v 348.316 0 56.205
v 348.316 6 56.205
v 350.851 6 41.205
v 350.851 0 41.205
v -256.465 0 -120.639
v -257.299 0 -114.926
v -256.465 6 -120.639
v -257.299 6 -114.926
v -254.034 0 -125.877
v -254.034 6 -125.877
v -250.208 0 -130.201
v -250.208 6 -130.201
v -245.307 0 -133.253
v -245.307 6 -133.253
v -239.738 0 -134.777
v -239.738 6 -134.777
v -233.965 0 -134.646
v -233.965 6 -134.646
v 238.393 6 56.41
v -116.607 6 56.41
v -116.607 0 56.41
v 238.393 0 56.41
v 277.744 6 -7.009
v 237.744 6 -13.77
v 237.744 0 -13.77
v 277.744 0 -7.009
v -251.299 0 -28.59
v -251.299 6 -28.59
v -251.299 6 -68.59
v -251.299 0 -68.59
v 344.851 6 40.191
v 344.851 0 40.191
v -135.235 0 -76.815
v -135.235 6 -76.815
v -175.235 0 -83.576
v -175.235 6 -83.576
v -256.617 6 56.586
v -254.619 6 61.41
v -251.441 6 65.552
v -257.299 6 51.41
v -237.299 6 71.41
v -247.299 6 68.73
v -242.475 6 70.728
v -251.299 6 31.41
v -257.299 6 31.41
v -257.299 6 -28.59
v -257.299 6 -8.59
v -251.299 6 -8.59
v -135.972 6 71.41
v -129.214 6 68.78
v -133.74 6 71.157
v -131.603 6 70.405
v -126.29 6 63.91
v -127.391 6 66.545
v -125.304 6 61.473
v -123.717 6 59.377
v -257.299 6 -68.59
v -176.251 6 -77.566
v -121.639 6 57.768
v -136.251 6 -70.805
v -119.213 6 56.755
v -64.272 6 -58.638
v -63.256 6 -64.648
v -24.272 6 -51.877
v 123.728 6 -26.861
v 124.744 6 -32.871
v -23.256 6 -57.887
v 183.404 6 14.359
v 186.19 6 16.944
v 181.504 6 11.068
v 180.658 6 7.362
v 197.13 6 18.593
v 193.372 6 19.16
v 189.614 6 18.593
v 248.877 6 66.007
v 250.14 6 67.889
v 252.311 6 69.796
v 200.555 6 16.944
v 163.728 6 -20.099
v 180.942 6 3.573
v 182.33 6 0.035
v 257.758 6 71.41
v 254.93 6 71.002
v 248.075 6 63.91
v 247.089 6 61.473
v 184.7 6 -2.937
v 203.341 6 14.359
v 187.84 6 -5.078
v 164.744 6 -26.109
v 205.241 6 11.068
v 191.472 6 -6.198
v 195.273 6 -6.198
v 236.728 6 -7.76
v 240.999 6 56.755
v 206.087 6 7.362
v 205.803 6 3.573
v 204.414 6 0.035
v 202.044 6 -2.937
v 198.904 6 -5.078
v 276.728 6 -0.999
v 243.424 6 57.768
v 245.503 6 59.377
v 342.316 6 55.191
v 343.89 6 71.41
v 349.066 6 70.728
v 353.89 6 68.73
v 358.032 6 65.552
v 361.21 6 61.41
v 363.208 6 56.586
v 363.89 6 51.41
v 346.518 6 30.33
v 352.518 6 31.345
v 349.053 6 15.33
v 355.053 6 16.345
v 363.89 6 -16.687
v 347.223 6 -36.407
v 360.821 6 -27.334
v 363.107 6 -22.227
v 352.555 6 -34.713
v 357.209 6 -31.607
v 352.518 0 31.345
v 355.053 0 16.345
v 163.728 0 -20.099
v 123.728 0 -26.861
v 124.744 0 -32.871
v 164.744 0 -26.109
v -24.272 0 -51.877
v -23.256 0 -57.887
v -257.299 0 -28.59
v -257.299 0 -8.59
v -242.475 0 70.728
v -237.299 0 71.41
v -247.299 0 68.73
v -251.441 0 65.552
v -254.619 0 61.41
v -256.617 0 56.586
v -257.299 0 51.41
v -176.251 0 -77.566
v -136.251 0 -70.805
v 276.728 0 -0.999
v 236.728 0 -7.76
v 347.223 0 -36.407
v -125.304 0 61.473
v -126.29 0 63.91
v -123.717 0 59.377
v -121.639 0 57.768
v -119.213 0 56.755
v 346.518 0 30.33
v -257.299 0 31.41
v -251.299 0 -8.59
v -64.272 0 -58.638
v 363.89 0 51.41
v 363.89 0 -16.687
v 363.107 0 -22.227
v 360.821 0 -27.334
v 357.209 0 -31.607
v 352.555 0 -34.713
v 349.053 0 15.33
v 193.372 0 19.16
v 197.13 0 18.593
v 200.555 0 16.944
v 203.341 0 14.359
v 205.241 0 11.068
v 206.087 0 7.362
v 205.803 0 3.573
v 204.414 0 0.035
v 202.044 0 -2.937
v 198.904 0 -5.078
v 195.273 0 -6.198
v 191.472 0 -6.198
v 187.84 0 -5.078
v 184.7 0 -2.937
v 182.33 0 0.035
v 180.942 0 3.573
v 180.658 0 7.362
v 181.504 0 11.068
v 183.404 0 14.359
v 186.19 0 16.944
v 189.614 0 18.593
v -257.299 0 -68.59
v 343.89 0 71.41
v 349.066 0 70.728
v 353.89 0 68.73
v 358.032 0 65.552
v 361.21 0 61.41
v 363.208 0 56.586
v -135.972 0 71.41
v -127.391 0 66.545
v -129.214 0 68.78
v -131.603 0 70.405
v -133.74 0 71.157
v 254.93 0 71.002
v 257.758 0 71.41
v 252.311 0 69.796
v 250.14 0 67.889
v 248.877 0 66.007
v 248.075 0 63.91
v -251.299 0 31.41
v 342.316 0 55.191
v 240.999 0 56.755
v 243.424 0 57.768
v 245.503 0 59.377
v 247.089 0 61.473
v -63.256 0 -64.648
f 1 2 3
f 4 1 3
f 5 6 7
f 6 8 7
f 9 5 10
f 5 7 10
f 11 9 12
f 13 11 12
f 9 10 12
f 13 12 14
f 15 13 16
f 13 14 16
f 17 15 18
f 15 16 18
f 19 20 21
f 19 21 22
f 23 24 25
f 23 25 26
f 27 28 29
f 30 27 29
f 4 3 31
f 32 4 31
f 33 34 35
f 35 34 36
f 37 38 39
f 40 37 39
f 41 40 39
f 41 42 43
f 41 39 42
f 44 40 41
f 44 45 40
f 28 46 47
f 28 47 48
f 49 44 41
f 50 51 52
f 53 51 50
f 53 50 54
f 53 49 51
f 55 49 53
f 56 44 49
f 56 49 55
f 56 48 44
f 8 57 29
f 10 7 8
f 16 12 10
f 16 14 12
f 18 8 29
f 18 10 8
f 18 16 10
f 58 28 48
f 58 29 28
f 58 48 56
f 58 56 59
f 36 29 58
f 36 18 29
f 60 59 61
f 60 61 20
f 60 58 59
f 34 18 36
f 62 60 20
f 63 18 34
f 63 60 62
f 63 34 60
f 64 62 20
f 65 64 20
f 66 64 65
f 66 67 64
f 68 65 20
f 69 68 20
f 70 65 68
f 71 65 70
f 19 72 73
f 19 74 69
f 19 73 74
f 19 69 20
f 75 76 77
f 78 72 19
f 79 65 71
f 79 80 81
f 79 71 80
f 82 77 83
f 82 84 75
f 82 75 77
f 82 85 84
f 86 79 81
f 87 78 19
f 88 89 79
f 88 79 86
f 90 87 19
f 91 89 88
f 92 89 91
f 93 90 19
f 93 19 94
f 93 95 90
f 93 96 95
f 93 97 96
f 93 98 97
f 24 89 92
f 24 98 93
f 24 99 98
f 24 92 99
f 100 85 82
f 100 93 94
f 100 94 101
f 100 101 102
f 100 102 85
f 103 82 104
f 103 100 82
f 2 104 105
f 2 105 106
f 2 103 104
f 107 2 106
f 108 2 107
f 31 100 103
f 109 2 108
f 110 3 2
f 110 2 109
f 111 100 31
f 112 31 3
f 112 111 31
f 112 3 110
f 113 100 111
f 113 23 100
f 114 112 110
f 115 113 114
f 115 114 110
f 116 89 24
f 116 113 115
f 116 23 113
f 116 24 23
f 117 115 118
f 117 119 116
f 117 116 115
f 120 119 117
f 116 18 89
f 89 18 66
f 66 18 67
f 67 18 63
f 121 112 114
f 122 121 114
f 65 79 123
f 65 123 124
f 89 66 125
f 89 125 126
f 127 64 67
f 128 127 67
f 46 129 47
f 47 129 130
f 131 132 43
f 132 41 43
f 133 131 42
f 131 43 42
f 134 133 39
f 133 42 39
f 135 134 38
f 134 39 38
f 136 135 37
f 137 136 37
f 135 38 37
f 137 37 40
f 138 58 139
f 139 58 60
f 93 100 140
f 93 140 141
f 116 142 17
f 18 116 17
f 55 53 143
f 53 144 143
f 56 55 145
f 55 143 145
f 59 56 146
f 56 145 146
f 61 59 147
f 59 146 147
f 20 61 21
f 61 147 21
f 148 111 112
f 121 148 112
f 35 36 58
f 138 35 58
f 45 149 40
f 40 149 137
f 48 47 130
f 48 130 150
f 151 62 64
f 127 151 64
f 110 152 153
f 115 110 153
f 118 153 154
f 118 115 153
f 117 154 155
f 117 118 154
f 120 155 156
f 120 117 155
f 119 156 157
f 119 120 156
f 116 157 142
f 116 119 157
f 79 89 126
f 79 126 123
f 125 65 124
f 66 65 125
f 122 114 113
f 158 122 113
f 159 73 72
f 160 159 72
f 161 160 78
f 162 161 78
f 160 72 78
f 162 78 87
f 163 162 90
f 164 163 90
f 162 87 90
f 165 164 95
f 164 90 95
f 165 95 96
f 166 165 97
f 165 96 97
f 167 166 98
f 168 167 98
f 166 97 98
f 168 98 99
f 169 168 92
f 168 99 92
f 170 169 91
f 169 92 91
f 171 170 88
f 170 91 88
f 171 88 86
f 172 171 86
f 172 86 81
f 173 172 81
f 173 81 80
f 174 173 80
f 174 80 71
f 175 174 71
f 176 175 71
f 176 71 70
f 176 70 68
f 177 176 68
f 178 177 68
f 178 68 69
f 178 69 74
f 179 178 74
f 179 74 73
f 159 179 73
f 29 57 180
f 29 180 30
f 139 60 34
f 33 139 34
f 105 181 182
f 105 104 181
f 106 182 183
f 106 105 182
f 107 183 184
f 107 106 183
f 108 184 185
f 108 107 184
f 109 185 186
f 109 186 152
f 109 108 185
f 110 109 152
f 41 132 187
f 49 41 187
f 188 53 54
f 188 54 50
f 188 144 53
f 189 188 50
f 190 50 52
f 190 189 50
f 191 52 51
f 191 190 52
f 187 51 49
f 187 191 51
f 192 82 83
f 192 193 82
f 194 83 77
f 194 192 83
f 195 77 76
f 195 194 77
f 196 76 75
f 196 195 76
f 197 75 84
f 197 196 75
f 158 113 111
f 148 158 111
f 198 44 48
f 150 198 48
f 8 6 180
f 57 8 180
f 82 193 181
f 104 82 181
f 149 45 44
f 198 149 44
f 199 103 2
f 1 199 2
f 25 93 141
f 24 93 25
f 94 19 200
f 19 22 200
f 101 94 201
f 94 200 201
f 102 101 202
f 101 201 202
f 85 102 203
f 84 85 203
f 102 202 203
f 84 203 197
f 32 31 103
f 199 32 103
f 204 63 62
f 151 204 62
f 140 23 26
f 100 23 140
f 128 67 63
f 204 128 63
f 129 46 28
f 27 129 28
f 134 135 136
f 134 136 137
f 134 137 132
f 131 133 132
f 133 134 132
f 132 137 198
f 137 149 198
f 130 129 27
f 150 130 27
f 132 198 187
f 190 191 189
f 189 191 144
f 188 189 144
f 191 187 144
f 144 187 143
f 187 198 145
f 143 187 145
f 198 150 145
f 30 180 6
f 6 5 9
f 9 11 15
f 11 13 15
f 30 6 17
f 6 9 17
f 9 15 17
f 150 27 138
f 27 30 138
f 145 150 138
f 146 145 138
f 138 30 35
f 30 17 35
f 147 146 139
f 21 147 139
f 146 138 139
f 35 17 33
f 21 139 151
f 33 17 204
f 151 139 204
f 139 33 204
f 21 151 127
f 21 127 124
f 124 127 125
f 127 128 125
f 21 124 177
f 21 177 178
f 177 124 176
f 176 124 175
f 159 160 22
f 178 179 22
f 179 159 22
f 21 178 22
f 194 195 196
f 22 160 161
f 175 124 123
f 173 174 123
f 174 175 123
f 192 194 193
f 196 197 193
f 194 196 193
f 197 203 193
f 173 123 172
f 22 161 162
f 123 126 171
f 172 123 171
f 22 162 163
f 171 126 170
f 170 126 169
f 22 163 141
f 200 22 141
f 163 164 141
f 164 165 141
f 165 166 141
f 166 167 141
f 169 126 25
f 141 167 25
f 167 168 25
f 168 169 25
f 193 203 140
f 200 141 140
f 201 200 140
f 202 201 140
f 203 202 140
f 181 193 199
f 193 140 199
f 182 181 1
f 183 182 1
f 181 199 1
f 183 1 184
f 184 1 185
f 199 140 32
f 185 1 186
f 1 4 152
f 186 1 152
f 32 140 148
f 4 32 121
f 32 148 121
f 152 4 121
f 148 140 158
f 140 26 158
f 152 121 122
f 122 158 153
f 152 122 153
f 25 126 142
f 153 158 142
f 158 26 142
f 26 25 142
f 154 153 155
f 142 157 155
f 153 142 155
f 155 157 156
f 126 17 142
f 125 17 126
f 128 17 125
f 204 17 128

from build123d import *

# Parameters (mm, degrees)
BOSS_EXTRUDE1_DEPTH = 6
CUT_EXTRUDE1_DEPTH  = 6
SKETCH6_W           = 375
SKETCH6_H           = 15
CUT_EXTRUDE2_DEPTH  = 6
FILLET1_R           = 10
FILLET2_R           = 10
FILLET4_R           = 20
FILLET5_R           = 10
SKETCH7_R           = 12.75
CUT_EXTRUDE3_DEPTH  = 10
SKETCH9_W           = 6
SKETCH9_H           = 40
CUT_EXTRUDE4_DEPTH  = 10


with BuildPart() as part:
    # Sketch3 → Boss-Extrude1 (new body)
    with BuildSketch(Plane(origin=(0, 0, 0), x_dir=(1, 0, 0), z_dir=(0, 1, 0))):
        Polygon((-257.298523245, 138.590313781), (-257.298523245, -71.409686219), (363.88985398, -71.409686219), (363.88985398, 33.590313781), align=None)
    extrude(amount=BOSS_EXTRUDE1_DEPTH)

    # Sketch4 → Cut-Extrude1 (cut)
    with BuildSketch(Plane(origin=(0, 6, 0), x_dir=(1, 0, 0), z_dir=(0, 1, 0))):
        Polygon((-135.235417729, 76.815026044), (-175.235417729, 83.576260082), (-176.251293143, 77.566260082), (-136.251293143, 70.805026044), align=None)
        Polygon((-63.256447035, 64.648359377), (-64.272322449, 58.638359377), (-24.272322449, 51.877125339), (-23.256447035, 57.887125339), align=None)
        Polygon((124.743552965, 32.870559399), (164.743552965, 26.109325362), (163.727677551, 20.099325362), (123.727677551, 26.860559399), align=None)
        Polygon((237.743552965, 13.770073242), (277.743552965, 7.008839205), (276.727677551, 0.998839205), (236.727677551, 7.760073242), align=None)
        Polygon((349.053244456, -15.330412914), (346.517781692, -30.330412914), (352.517781692, -31.34459802), (355.053244456, -16.34459802), align=None)
        Polygon((344.851115025, -40.190545886), (342.315652261, -55.190545886), (348.315652261, -56.204730992), (350.851115025, -41.204730992), align=None)
    extrude(amount=-CUT_EXTRUDE1_DEPTH, mode=Mode.SUBTRACT)

    # Sketch6 → Cut-Extrude2 (cut)
    with BuildSketch(Plane(origin=(0, 6, 0), x_dir=(1, 0, 0), z_dir=(0, 1, 0))):
        with Locations((60.89290198, -63.909686219)):
            Rectangle(SKETCH6_W, SKETCH6_H)
    extrude(amount=-CUT_EXTRUDE2_DEPTH, mode=Mode.SUBTRACT)

    # Fillet1
    fillet1_edges = [part.edges().sort_by_distance(p)[0] for p in [
        (-126.60709802, 3, 56.409686219),
    ]]
    fillet(fillet1_edges, radius=FILLET1_R)

    # Fillet2
    fillet2_edges = [part.edges().sort_by_distance(p)[0] for p in [
        (248.39290198, 3, 56.409686219),
    ]]
    fillet(fillet2_edges, radius=FILLET2_R)

    # Fillet4
    fillet4_edges = [part.edges().sort_by_distance(p)[0] for p in [
        (363.88985398, 3, -33.590313781),
        (363.88985398, 3, 71.409686219),
        (-257.298523245, 3, 71.409686219),
        (-257.298523245, 3, -138.590313781),
    ]]
    fillet(fillet4_edges, radius=FILLET4_R)

    # Fillet5
    fillet5_edges = [part.edges().sort_by_distance(p)[0] for p in [
        (248.39290198, 3, 71.409686219),
        (-126.60709802, 3, 71.409686219),
    ]]
    fillet(fillet5_edges, radius=FILLET5_R)

    # Sketch7 → Cut-Extrude3 (cut)
    with BuildSketch(Plane(origin=(0, 6, 0), x_dir=(1, 0, 0), z_dir=(0, 1, 0))):
        with Locations(Location((193.372247473, -6.409686219, 0), (0, 0, 270))):
            Circle(SKETCH7_R)
    extrude(amount=-CUT_EXTRUDE3_DEPTH, mode=Mode.SUBTRACT)

    # Sketch9 → Cut-Extrude4 (cut)
    with BuildSketch(Plane(origin=(0, 6, 0), x_dir=(1, 0, 0), z_dir=(0, 1, 0))):
        with Locations((-254.298523245, 48.590313781)):
            Rectangle(SKETCH9_W, SKETCH9_H)
        with Locations((-254.298523245, -11.409686219)):
            Rectangle(SKETCH9_W, SKETCH9_H)
    extrude(amount=-CUT_EXTRUDE4_DEPTH, mode=Mode.SUBTRACT)


solid = part.part
